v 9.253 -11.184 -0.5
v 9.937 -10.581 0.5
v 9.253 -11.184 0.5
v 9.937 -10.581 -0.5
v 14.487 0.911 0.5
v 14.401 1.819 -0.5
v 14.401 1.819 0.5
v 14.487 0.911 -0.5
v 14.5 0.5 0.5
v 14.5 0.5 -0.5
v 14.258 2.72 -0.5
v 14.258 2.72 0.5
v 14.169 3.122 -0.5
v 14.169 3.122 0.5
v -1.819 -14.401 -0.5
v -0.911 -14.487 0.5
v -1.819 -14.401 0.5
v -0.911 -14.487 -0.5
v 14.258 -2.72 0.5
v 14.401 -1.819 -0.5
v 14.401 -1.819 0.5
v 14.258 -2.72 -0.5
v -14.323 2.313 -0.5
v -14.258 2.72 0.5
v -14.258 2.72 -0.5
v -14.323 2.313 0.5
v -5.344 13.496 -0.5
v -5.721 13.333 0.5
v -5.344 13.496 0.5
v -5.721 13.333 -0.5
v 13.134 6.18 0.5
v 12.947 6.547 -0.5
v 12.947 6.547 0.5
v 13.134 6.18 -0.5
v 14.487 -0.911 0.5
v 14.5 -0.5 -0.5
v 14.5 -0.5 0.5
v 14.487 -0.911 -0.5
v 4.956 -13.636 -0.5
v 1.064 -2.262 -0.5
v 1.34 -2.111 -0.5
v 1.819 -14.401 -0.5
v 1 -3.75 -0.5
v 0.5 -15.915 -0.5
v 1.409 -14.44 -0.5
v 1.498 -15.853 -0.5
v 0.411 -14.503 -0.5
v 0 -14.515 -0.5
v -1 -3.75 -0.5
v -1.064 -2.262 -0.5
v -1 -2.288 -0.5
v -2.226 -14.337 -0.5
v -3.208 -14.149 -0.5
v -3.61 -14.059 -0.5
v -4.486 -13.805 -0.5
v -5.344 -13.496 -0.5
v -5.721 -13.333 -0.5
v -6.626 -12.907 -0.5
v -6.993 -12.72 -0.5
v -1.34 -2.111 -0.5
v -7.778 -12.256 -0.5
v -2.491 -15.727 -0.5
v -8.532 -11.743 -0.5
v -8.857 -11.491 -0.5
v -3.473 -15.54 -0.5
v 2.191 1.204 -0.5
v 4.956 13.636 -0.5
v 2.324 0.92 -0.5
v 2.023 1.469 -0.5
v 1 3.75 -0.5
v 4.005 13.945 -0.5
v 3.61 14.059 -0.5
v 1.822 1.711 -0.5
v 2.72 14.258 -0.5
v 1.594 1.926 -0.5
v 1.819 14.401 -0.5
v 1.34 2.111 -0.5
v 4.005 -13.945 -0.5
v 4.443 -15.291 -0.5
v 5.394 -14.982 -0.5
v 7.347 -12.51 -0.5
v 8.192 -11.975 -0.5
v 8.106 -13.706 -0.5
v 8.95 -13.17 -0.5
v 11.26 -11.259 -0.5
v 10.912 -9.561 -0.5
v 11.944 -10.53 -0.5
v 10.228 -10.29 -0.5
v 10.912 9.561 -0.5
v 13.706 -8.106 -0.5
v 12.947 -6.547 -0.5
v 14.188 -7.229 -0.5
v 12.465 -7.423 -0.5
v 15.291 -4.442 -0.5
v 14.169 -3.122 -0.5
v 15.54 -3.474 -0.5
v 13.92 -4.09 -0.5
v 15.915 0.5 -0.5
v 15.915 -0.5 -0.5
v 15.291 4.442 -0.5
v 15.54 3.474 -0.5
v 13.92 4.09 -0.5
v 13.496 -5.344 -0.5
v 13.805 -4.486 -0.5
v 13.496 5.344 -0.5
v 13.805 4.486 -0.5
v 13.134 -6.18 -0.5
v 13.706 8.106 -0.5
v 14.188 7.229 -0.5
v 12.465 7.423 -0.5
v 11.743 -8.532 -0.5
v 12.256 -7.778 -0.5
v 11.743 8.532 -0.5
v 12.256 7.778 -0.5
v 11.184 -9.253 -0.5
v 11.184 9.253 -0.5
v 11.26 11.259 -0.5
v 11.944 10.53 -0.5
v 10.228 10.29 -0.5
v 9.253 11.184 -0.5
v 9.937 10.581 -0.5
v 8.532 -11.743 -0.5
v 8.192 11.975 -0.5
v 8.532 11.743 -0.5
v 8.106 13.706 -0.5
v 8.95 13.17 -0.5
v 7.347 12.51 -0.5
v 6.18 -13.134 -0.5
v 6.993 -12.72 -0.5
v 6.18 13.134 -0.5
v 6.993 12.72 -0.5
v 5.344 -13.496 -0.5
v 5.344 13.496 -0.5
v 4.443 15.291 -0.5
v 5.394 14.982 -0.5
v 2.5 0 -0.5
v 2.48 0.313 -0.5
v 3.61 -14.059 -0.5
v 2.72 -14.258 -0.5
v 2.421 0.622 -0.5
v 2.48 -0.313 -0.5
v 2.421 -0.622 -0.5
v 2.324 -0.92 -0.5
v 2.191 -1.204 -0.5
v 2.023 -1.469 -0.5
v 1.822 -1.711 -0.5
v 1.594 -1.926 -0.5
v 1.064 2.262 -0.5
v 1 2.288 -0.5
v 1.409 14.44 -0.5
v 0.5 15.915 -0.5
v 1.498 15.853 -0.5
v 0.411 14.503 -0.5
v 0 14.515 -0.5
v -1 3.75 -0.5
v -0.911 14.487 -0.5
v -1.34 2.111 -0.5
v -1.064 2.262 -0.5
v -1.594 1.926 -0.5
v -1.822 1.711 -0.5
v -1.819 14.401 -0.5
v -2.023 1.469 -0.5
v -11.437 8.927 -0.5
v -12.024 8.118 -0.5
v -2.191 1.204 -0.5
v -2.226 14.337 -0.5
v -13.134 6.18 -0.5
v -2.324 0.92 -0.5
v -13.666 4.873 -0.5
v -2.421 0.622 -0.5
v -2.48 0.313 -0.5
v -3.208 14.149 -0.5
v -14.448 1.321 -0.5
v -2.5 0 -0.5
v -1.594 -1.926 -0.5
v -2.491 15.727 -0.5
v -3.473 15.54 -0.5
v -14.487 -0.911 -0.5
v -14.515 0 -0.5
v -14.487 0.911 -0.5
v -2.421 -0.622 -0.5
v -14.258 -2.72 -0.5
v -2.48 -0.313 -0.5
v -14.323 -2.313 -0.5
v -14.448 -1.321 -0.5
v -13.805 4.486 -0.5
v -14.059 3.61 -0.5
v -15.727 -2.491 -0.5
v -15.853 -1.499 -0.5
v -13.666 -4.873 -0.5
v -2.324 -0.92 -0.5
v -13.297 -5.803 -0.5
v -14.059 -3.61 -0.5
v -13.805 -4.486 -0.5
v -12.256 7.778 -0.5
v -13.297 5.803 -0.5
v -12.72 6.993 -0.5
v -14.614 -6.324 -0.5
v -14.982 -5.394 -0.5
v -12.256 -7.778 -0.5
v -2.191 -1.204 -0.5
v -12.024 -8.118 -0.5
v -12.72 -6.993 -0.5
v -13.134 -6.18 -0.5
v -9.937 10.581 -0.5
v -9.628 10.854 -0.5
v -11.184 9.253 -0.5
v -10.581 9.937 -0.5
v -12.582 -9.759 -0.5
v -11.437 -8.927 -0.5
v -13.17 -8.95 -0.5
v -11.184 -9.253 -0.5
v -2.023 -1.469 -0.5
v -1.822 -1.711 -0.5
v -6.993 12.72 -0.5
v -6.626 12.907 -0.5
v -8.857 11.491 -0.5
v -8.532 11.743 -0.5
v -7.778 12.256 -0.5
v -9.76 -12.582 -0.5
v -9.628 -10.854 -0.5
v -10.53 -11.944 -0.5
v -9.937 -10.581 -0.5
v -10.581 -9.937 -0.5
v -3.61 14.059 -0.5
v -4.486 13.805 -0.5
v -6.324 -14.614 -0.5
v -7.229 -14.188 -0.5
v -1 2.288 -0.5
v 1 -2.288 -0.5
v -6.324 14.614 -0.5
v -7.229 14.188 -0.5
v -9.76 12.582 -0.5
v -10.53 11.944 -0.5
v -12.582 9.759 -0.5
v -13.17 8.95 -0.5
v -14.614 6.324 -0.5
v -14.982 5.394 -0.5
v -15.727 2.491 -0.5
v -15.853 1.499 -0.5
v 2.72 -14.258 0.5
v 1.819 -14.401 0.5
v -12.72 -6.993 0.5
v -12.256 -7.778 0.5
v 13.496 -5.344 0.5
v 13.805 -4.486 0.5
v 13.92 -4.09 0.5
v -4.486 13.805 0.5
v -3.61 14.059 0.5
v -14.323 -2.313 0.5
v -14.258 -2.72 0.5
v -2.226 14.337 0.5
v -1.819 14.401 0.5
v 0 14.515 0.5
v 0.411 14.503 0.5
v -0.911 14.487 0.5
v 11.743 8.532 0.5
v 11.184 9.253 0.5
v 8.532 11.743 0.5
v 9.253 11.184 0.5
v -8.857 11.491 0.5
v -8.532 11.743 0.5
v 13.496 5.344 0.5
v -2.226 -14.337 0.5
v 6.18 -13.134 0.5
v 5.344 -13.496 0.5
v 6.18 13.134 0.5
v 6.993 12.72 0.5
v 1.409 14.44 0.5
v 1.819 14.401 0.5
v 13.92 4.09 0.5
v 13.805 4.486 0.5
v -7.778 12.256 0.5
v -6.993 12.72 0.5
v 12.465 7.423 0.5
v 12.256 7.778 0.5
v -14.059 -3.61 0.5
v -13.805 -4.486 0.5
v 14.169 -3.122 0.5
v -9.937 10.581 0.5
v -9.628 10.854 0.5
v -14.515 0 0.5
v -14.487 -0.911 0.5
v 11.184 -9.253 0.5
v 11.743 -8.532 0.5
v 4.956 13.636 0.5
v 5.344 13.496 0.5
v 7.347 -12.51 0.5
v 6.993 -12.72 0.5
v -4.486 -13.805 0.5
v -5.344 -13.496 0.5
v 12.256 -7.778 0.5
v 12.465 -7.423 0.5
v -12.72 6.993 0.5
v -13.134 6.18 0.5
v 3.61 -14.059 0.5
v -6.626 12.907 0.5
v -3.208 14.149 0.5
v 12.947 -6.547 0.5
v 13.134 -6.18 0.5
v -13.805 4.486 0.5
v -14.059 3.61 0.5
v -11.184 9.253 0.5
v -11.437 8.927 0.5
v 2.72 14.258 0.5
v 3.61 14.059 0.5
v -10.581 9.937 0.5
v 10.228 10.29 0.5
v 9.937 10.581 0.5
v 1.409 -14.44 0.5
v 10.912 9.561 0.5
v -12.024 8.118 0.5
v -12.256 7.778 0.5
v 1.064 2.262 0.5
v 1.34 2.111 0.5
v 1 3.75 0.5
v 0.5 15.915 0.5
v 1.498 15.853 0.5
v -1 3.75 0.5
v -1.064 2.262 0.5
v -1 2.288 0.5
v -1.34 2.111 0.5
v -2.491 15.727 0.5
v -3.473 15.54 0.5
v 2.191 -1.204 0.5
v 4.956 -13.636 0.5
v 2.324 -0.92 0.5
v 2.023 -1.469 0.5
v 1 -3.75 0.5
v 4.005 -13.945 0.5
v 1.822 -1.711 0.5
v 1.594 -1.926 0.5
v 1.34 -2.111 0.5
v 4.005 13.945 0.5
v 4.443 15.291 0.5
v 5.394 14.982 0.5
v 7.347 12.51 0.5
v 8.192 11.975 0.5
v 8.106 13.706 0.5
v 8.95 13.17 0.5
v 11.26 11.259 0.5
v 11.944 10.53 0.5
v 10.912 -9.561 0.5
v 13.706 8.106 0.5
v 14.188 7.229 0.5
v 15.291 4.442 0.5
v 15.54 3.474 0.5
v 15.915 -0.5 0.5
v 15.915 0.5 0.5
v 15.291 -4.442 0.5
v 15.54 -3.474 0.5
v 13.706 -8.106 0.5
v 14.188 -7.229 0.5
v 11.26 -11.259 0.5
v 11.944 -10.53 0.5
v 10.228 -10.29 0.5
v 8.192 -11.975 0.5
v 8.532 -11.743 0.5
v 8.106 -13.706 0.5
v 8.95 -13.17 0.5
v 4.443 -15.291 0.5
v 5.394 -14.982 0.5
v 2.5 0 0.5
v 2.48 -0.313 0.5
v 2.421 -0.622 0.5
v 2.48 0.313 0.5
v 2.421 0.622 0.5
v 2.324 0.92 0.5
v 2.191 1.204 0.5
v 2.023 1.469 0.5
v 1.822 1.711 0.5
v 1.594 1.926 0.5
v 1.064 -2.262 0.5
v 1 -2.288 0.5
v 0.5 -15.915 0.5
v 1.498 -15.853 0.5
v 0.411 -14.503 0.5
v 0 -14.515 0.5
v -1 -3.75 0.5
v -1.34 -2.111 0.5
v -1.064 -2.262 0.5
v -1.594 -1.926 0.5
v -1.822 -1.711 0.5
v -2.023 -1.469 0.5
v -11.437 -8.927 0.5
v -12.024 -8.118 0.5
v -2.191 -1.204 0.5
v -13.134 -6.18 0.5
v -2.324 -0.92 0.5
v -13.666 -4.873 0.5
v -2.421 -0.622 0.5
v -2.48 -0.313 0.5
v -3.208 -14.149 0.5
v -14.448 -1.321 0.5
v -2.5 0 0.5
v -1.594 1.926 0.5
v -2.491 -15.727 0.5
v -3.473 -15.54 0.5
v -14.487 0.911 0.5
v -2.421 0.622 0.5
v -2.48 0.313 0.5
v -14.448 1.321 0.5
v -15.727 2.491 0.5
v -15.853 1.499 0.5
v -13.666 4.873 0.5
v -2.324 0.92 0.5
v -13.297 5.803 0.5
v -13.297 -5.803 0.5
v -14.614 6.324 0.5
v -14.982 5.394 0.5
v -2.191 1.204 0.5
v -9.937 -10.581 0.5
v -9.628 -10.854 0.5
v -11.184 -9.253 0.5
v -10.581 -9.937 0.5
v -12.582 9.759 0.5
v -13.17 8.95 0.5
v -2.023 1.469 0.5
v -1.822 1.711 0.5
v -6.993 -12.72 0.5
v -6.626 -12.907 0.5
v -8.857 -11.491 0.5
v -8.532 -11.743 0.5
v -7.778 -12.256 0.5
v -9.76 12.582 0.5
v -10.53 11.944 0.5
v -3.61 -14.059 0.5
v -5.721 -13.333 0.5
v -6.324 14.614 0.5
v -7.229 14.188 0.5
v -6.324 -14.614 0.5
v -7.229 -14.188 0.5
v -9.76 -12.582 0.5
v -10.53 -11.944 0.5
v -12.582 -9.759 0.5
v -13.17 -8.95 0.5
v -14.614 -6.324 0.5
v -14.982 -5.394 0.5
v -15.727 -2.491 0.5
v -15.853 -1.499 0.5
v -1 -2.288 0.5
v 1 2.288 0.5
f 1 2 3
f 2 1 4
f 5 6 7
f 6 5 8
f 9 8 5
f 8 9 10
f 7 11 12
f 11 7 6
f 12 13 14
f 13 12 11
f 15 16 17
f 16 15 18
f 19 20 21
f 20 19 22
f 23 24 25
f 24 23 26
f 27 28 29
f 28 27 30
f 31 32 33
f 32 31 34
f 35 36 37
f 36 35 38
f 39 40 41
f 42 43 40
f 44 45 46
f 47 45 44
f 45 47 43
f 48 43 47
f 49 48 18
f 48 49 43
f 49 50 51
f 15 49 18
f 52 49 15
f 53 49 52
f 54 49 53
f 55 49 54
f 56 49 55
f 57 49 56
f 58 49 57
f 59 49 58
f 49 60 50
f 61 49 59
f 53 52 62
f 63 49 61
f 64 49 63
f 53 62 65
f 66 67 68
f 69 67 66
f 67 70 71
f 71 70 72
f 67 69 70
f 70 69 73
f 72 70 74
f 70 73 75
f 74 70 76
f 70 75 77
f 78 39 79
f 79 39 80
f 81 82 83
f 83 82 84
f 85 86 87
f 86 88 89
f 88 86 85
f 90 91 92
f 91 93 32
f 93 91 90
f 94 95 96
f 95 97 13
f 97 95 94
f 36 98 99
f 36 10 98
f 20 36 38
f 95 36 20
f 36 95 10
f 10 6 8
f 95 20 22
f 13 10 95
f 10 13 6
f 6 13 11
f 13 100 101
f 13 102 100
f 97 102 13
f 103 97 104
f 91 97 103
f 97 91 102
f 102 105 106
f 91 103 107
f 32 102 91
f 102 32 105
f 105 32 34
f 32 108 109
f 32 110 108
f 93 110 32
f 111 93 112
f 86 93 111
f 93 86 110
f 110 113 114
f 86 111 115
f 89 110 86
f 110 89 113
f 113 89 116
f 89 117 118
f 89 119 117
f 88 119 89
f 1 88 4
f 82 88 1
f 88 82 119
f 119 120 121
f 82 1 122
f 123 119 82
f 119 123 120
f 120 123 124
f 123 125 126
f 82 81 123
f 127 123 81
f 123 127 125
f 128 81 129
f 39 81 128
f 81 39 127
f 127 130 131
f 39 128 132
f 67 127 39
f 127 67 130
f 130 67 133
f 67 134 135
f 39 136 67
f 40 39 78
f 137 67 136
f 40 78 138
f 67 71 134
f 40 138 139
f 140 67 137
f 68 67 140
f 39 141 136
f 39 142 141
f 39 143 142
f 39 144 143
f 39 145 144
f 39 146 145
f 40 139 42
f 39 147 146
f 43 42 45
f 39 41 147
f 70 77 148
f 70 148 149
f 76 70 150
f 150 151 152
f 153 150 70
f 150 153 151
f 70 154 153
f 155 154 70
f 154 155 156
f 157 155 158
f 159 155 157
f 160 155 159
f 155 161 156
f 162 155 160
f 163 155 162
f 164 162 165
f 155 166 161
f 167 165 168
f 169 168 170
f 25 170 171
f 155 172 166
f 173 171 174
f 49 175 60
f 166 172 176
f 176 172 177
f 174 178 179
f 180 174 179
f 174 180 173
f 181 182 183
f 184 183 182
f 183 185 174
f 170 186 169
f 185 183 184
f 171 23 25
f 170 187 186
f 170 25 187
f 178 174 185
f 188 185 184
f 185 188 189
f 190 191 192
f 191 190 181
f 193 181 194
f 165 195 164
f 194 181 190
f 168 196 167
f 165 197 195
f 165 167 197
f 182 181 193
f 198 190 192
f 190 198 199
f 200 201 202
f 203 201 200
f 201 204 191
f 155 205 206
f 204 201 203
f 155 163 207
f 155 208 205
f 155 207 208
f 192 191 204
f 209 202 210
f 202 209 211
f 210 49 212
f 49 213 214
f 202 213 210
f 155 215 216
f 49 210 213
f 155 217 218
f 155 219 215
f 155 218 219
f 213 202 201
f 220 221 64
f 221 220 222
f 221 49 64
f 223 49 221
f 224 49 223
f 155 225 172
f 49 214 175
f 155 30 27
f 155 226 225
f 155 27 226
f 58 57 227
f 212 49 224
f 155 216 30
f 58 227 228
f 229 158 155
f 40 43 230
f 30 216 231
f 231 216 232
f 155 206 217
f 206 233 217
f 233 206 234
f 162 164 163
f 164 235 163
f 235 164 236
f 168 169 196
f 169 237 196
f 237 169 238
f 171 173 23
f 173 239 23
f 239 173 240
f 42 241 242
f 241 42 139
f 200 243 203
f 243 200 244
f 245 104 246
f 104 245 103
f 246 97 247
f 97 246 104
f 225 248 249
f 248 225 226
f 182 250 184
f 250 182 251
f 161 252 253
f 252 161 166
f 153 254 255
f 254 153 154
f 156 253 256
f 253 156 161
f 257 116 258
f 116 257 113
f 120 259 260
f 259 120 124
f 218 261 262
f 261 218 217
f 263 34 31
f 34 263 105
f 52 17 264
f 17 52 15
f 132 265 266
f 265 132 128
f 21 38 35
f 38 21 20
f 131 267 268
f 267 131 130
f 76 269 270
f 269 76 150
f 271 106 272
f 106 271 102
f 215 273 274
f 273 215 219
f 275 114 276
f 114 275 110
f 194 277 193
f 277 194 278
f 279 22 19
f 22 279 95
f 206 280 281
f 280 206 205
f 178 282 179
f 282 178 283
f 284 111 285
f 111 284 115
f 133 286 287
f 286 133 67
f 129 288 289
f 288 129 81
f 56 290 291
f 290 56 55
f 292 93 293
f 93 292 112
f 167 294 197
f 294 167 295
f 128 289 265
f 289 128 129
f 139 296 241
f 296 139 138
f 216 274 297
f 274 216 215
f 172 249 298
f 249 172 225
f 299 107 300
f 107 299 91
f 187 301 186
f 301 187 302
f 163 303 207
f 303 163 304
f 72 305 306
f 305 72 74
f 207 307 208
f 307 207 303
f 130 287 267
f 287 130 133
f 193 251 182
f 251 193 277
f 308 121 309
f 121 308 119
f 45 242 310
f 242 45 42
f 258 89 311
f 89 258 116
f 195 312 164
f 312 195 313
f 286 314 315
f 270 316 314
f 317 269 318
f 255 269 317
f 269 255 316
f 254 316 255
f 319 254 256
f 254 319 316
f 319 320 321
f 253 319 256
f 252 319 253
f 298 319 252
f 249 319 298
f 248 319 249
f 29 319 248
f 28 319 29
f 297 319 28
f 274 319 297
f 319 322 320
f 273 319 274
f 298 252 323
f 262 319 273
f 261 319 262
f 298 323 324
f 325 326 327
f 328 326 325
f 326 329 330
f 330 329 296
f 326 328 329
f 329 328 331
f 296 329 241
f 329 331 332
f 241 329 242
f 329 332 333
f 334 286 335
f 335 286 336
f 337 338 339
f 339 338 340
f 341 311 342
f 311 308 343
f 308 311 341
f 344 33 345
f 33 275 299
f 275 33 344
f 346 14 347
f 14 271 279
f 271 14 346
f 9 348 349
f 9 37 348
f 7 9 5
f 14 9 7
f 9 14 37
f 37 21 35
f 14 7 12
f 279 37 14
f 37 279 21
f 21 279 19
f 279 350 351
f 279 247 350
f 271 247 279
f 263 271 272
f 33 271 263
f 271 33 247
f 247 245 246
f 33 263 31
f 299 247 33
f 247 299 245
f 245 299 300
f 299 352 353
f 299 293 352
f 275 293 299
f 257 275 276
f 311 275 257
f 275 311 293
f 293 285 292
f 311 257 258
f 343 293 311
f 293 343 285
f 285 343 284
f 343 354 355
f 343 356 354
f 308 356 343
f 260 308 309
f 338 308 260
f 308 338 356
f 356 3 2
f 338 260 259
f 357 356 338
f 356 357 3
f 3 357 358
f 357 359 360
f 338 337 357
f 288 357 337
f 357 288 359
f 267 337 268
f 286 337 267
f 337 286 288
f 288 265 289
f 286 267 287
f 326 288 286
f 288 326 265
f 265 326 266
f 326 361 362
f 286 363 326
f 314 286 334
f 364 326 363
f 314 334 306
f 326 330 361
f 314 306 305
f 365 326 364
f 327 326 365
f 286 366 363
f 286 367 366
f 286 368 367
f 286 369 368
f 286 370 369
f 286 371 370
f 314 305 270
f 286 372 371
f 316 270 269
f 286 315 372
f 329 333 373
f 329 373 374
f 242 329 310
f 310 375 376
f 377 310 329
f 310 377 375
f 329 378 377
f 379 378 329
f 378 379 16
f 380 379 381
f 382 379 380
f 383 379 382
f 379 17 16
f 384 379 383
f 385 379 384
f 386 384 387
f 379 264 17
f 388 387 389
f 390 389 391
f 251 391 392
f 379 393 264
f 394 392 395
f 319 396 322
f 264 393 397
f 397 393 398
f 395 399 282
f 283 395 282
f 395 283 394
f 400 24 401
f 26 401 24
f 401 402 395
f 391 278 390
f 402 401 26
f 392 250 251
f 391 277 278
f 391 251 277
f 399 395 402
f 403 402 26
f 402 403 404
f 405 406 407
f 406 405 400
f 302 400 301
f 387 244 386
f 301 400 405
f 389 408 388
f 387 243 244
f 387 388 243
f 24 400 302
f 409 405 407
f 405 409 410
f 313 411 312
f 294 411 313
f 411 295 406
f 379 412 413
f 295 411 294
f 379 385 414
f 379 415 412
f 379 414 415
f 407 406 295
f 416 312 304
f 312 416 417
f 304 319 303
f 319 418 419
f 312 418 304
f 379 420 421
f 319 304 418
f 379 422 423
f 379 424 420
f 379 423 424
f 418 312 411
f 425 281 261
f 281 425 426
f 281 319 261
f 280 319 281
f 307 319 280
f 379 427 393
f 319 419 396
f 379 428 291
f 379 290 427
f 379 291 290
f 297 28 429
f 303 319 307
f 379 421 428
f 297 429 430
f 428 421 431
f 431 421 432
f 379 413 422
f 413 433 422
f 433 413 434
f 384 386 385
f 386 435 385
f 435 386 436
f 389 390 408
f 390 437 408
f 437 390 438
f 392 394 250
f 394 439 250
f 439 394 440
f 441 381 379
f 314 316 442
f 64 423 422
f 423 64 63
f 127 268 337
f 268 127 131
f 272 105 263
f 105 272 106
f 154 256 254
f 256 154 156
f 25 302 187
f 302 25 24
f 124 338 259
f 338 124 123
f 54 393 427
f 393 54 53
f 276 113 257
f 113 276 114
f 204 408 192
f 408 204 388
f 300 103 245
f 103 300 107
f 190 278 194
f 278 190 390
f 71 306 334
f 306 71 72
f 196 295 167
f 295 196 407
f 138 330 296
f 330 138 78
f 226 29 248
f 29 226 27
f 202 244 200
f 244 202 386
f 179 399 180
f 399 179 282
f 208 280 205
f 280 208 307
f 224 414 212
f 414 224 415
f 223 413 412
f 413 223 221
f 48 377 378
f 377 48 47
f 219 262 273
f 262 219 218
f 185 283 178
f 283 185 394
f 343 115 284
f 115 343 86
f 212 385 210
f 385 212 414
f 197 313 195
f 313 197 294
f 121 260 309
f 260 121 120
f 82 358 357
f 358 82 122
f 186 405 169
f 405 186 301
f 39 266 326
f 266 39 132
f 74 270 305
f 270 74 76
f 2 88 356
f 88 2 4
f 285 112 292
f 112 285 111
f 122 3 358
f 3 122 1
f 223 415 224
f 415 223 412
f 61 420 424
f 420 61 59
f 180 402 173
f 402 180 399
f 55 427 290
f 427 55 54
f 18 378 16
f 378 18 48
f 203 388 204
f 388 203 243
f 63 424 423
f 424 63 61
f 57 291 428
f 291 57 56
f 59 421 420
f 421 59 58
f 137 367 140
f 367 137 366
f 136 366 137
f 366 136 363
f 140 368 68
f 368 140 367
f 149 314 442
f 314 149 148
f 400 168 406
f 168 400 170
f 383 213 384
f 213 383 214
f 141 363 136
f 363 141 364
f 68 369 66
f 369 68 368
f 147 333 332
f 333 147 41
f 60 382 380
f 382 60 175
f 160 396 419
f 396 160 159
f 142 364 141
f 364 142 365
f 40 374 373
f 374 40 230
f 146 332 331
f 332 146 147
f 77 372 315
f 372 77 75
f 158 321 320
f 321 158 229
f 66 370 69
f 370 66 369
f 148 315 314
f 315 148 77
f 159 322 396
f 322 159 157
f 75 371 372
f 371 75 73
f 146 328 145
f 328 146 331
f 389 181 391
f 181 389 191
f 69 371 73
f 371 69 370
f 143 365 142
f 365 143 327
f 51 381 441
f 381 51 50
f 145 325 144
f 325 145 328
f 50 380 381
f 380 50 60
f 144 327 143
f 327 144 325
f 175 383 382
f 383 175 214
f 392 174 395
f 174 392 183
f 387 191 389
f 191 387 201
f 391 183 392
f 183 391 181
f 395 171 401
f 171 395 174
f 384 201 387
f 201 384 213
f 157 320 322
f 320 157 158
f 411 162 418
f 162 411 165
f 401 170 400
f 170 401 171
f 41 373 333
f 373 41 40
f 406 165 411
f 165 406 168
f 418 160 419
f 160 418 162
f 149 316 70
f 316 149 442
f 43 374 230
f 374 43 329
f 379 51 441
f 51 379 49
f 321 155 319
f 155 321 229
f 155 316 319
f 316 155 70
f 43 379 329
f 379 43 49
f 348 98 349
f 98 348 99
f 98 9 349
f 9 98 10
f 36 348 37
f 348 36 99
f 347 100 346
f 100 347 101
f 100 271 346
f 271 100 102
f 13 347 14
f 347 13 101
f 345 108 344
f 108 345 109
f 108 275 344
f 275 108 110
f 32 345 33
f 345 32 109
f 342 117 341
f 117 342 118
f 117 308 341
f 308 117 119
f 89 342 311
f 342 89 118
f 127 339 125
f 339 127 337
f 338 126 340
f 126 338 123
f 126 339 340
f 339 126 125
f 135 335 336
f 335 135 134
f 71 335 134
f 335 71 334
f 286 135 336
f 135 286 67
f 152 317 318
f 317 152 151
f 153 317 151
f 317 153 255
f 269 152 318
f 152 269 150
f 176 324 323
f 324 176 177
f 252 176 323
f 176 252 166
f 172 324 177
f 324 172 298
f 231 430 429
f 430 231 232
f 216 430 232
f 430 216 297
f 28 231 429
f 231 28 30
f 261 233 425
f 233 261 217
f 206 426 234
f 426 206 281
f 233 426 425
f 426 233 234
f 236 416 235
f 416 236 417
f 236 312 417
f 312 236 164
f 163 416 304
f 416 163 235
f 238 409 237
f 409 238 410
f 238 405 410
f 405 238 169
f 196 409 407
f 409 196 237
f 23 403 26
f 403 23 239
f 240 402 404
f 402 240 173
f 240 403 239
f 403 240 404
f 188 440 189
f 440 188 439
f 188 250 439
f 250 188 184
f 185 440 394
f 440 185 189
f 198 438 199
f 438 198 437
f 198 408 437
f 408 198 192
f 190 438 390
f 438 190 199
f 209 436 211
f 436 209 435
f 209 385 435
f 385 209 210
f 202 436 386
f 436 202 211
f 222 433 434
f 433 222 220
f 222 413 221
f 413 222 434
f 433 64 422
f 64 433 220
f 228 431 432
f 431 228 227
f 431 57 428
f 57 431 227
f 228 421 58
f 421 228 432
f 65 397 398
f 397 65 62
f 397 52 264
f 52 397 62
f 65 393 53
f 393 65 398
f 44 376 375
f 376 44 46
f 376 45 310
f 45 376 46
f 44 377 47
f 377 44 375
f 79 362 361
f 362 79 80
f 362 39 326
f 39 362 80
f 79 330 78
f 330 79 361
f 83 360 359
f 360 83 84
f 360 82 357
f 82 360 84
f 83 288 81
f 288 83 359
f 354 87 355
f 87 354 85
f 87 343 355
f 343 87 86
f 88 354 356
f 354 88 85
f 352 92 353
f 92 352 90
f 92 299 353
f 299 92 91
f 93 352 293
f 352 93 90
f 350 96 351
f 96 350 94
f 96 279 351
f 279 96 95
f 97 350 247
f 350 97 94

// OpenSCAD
// === Parameters ===
hole_pitch = 4;               // Distance between tape holes (mm)
tooth_width = 1.0;            // Width of each tooth (approx hole size)
tooth_height = 1.5;           // How far tooth sticks out from gear edge
gear_thickness = 1.0;           // Thickness of the flat gear
center_hole_diameter = 5;     // Shaft hole in center

num_teeth = 25;  // derived later if needed
gear_pitch_diameter = hole_pitch * num_teeth / PI;  // Ensures 4mm pitch

// === Gear generation ===
module smt_tape_sprocket() {
    tooth_radius = gear_pitch_diameter / 2 + 0;
    hub_radius = tooth_radius - tooth_height + 0.1;

    union() {
        // Base gear disk
        difference() {
            cylinder(h = gear_thickness, r = hub_radius, center=true, $fn=100);
            
            // Optional shaft hole
            translate([0,0,-0.1])
            cylinder(h = gear_thickness + 1, r = center_hole_diameter / 2, center=true, $fn=50);

            // Key
            cube([2,center_hole_diameter * 1.5,gear_thickness*2], center=true);
        }

        // Add teeth around the perimeter
        for (i = [0 : num_teeth - 1]) {
            angle = i * 360 / num_teeth;
            x = (tooth_radius - tooth_height / 2) * cos(angle);
            y = (tooth_radius - tooth_height / 2) * sin(angle);

            // Teeth are small rectangular extrusions
            translate([x, y, 0])
            rotate([0, 0, angle])
            cube([tooth_height, tooth_width, gear_thickness], center=true);
        }
    }
}

// === Run it ===
smt_tape_sprocket();
